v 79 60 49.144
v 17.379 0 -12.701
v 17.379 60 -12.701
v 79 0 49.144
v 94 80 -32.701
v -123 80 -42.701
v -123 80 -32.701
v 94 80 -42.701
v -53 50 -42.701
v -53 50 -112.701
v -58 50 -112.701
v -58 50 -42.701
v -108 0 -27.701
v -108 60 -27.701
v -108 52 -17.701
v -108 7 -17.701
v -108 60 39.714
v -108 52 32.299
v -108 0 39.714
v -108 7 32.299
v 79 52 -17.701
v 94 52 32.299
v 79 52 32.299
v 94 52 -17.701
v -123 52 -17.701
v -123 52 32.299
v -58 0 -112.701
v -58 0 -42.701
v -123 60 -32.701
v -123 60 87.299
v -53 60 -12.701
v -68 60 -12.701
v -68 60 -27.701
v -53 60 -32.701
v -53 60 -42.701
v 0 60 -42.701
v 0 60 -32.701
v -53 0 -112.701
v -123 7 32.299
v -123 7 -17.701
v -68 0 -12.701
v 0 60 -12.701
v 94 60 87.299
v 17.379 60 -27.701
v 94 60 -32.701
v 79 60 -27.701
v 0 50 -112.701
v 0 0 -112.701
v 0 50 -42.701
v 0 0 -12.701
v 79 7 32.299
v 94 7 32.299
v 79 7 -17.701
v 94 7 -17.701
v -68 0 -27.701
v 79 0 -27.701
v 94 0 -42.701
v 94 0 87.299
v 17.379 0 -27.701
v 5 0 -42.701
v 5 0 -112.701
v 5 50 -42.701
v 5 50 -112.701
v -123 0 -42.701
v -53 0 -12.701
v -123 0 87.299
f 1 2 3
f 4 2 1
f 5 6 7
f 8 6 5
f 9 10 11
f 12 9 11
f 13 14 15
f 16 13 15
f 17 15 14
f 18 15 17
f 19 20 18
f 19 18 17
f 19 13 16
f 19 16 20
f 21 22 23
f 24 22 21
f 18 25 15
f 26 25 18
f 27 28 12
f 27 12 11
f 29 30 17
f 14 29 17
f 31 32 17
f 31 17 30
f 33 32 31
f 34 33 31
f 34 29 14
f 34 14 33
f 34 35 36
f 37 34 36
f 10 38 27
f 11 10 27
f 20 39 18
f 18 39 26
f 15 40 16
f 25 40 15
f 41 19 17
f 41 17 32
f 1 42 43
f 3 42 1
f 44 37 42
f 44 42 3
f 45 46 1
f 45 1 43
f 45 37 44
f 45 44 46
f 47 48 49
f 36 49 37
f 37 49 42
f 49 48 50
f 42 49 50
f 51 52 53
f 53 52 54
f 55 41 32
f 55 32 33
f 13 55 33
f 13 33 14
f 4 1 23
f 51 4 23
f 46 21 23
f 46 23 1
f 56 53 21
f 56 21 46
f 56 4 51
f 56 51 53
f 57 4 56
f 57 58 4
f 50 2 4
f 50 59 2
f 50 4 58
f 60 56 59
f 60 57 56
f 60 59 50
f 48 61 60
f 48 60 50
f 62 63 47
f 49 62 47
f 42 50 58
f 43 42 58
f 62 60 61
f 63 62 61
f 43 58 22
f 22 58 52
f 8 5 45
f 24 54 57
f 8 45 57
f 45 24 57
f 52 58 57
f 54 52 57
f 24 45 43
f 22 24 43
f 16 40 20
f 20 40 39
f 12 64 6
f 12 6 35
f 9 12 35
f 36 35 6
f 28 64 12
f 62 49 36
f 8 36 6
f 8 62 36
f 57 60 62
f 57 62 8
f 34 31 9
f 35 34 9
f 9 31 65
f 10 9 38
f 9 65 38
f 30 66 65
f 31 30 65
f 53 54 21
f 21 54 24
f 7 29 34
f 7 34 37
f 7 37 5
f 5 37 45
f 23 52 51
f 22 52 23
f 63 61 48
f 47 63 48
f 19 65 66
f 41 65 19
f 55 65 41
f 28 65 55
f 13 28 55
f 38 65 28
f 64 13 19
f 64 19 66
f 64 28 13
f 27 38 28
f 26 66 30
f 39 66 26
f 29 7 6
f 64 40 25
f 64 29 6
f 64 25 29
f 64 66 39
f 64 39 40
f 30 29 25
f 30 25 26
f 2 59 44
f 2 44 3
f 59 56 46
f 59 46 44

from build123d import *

# Parameters (mm, degrees)
BOSS_EXTRUDE1_DEPTH   = 60
BOSS_EXTRUDE1_2_DEPTH = 60
SKETCH3_W             = 217
SKETCH3_H             = 10
BOSS_EXTRUDE3_DEPTH   = 20
SKETCH4_W             = 5
SKETCH4_H             = 70
BOSS_EXTRUDE4_DEPTH   = 50
SKETCH5_W             = 5
SKETCH5_H             = 70
BOSS_EXTRUDE5_DEPTH   = 50
SKETCH6_W             = 50
SKETCH6_H             = 45
CUT_EXTRUDE1_DEPTH    = 30
SKETCH7_W             = 50
SKETCH7_H             = 45
CUT_EXTRUDE2_DEPTH    = 20


with BuildPart() as part:
    # Sketch1 → Boss-Extrude1 (new body)
    with BuildSketch(Plane(origin=(0, 0, 0), x_dir=(1, 0, 0), z_dir=(0, 1, 0))):
        Polygon((0, 42.700803213), (0, 27.700803213), (0, 12.700803213), (94, -87.299196787), (94, 42.700803213), align=None)
        Polygon((79, -49.143729641), (79, 27.700803213), (17.378559694, 27.700803213), (17.378559694, 12.700803213), align=None, mode=Mode.SUBTRACT)
    extrude(amount=BOSS_EXTRUDE1_DEPTH)



with BuildPart() as body_2:
    # Sketch1 → Boss-Extrude1 2 (new body)
    with BuildSketch(Plane(origin=(0, 0, 0), x_dir=(1, 0, 0), z_dir=(0, 1, 0))):
        Polygon((-123, 12.700803213), (-123, -87.299196787), (-53, 12.700803213), (-53, 42.700803213), (-123, 42.700803213), align=None)
        Polygon((-108, 27.700803213), (-108, -39.713720468), (-68, 12.700803213), (-68, 27.700803213), align=None, mode=Mode.SUBTRACT)
    extrude(amount=BOSS_EXTRUDE1_2_DEPTH)

    # Sketch3 → Boss-Extrude3 (add)
    with BuildSketch(Plane(origin=(0, 60, 0), x_dir=(1, 0, 0), z_dir=(0, 1, 0))):
        with Locations((-14.5, 37.700803213)):
            Rectangle(SKETCH3_W, SKETCH3_H)
    extrude(amount=BOSS_EXTRUDE3_DEPTH)

    # Sketch4 → Boss-Extrude4 (add)
    with BuildSketch(Plane(origin=(0, 0, 0), x_dir=(-1, 0, 0), z_dir=(0, -1, 0))):
        with Locations((55.5, 77.700803213)):
            Rectangle(SKETCH4_W, SKETCH4_H)
    extrude(amount=-BOSS_EXTRUDE4_DEPTH)


with BuildPart() as part_1:
    add(part.part)

    add(body_2.part)  # Boss-Extrude5 merges body 2
    # Sketch5 → Boss-Extrude5 (add)
    with BuildSketch(Plane(origin=(0, 0, 0), x_dir=(-1, 0, 0), z_dir=(0, -1, 0))):
        with Locations((-2.5, 77.700803213)):
            Rectangle(SKETCH5_W, SKETCH5_H)
    extrude(amount=-BOSS_EXTRUDE5_DEPTH)

    # Sketch6 → Cut-Extrude1 (cut)
    with BuildSketch(Plane(origin=(94, 0, 0), x_dir=(0, 0, -1), z_dir=(1, 0, 0))):
        with Locations((-7.299196787, 29.5)):
            Rectangle(SKETCH6_W, SKETCH6_H)
    extrude(amount=-CUT_EXTRUDE1_DEPTH, mode=Mode.SUBTRACT)

    # Sketch7 → Cut-Extrude2 (cut)
    with BuildSketch(Plane.ZY.offset(123)):
        with Locations((7.299196787, 29.5)):
            Rectangle(SKETCH7_W, SKETCH7_H)
    extrude(amount=-CUT_EXTRUDE2_DEPTH, mode=Mode.SUBTRACT)


solid = part_1.part
